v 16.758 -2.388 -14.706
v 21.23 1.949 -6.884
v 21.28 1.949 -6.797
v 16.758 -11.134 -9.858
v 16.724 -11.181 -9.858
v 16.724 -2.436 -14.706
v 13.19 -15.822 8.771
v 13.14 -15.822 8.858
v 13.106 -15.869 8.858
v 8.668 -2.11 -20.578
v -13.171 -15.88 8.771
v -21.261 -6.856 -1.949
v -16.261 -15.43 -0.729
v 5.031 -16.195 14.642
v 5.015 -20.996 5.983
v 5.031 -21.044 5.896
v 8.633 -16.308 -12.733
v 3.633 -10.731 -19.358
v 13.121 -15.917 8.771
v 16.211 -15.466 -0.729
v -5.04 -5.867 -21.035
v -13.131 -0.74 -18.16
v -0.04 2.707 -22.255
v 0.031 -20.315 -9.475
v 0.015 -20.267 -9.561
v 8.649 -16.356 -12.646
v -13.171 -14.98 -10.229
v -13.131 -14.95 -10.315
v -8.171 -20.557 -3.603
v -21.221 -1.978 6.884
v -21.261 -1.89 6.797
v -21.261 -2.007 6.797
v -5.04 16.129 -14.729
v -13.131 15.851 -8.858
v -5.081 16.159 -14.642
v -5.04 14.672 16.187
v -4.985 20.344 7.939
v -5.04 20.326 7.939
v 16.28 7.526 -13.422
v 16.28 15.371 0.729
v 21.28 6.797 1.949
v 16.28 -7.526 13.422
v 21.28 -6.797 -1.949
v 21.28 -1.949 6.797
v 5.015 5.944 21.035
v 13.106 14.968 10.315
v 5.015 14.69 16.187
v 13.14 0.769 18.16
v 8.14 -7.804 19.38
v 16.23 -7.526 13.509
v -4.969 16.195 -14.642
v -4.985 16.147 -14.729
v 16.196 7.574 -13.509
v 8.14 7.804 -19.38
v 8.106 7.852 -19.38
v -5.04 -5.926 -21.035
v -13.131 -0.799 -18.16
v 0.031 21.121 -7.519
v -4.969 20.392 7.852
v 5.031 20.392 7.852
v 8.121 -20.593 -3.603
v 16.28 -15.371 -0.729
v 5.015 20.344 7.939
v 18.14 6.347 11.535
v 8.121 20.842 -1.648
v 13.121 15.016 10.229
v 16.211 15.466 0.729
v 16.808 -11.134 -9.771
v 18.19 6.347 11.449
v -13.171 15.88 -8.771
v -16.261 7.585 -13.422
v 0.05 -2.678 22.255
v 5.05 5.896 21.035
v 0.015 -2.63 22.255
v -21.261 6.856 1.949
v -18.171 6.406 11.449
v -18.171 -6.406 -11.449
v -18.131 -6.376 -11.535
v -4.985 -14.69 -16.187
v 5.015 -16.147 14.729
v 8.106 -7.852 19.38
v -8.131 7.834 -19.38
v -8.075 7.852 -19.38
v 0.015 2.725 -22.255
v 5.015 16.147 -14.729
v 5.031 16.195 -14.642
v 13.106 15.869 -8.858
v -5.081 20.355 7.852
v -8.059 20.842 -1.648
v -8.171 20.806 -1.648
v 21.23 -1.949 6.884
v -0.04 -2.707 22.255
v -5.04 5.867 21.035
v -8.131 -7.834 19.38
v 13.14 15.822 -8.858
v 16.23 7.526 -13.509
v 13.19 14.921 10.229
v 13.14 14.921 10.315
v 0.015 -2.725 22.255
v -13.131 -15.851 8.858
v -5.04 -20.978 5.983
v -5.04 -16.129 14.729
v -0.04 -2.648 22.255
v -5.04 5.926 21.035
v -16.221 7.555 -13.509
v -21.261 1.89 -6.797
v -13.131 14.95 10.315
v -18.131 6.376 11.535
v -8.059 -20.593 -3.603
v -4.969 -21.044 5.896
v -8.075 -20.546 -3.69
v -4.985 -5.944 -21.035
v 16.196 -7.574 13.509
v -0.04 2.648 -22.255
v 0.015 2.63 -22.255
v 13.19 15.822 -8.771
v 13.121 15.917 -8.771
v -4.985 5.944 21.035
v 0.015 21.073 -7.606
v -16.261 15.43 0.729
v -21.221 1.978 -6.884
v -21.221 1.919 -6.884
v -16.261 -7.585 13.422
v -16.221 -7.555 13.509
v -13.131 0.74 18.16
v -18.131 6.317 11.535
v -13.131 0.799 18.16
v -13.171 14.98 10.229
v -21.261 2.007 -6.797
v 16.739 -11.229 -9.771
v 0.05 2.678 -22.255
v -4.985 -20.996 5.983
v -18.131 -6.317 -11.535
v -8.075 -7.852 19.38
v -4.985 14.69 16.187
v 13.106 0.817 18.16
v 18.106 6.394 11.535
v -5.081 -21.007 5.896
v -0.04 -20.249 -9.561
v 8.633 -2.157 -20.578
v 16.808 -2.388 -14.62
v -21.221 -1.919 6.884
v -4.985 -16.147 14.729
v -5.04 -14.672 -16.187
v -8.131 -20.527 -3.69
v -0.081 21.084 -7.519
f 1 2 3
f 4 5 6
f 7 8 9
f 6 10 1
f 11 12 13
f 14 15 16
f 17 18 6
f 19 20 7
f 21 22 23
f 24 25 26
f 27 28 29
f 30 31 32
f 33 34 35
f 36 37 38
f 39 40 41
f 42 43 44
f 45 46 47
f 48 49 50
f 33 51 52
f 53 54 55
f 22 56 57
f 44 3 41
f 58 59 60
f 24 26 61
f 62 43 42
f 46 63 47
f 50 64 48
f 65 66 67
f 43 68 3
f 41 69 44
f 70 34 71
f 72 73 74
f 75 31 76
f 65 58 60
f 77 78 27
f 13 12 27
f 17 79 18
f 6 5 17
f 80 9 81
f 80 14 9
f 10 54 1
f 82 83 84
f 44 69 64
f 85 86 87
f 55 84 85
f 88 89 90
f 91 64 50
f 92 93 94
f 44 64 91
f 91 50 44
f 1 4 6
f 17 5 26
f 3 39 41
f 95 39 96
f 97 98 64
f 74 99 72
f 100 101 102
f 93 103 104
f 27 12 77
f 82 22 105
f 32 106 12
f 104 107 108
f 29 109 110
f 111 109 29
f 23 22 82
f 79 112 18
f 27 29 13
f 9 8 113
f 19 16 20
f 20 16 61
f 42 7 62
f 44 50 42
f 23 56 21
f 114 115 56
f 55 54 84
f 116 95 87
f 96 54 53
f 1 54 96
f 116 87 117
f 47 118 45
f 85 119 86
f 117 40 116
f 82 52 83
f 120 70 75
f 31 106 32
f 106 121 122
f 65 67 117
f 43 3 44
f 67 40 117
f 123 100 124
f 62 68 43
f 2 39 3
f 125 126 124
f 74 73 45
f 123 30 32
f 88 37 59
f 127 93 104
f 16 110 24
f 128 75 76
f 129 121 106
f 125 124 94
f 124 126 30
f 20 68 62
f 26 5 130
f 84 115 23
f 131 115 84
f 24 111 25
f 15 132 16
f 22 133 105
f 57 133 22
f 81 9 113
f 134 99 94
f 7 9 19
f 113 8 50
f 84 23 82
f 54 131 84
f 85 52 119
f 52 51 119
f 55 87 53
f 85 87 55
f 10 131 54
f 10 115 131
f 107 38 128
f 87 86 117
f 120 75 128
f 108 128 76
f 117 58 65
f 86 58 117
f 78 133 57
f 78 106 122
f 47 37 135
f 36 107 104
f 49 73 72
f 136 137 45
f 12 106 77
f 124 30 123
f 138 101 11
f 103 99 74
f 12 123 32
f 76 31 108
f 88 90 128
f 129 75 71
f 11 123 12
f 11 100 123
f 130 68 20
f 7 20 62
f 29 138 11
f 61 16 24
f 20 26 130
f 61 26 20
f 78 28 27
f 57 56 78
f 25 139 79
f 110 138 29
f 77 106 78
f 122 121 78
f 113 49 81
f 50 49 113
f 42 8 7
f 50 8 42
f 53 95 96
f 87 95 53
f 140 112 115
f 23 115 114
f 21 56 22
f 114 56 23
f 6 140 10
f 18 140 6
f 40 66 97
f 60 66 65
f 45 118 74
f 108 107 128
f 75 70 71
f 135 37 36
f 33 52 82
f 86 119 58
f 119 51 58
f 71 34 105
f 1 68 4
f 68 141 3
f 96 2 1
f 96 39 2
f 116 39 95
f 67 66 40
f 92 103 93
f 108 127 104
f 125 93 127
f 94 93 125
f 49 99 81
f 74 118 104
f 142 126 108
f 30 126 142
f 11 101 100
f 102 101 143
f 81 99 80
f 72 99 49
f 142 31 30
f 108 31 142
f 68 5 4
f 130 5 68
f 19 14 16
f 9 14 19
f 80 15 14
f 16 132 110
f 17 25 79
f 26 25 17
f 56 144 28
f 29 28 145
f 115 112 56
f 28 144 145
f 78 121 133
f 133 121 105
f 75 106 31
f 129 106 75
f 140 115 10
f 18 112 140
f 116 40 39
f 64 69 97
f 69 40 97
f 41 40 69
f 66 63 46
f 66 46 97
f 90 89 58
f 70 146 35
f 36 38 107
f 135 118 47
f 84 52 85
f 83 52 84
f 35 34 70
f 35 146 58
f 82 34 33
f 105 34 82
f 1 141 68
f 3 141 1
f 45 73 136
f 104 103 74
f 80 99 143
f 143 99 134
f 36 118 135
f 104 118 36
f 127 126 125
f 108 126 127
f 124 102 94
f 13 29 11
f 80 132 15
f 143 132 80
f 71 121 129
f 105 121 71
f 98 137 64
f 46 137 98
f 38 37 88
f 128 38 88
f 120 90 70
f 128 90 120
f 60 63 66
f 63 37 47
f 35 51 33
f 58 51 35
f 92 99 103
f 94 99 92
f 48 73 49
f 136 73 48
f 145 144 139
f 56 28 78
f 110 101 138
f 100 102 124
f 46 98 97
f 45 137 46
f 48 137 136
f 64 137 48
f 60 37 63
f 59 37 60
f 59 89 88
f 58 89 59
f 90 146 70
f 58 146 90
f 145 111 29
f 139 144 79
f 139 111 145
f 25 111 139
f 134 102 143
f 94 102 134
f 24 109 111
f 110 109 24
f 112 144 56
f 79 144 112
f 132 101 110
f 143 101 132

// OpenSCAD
// Auto-generated OpenSCAD file

    inner_points = 10*[[0.5000000000001233, 1.6099947582269307, -1.4642352461204697], [-1.6180339887500594, -0.7526043623065494, 1.3422446358941107], [0.8090169943752056, 0.7804419520270026, -1.929370322107236], [-1.3090169943749772, -1.5821571685064775, 0.8771095599073444], [1.3090169943749772, 1.5821571685064775, -0.8771095599073444], [-0.8090169943752056, -0.7804419520270026, 1.929370322107236], [1.6180339887500594, 0.7526043623065494, -1.3422446358941107], [-0.5000000000001233, -1.6099947582269307, 1.4642352461204697], [-1.6180339887497301, 0.752604362306319, -1.342244635894637], [-2.118033988749798, 0.1948703662791984, -0.6797246062536065], [-1.309016994374648, -0.07694844389360919, -1.8073797118814032], [-1.8090169943747159, -0.6346824399207297, -1.144859682240373], [1.8090169943747159, 0.6346824399207297, 1.144859682240373], [1.309016994374648, 0.07694844389360919, 1.8073797118814032], [2.118033988749798, -0.1948703662791984, 0.6797246062536065], [1.6180339887497301, -0.752604362306319, 1.342244635894637], [-2.7630675525358583e-14, 2.1025431187665826, -0.7519178221235898], [-1.30901699437522, 1.4920728358409685, 1.0228690720136886], [0.8618033988753376, -0.21095885990434457, -2.0491118170111076], [2.9809488211185453e-13, -2.021969242147636, -0.9474747285857835], [0.8090169943748263, 2.0747055290461294, -0.1647921359104645], [-0.500000000000366, 1.4642352461205153, 1.609994758226814], [1.6708203932501915, -0.2387964496247978, -1.4619861307979825], [0.8090169943751521, -2.0498068318680893, -0.3603490423726582], [-0.5000000000002721, 2.0296633627133747, 0.7851971800500518], [-1.309016994375247, 0.07694844389342262, 1.8073797118809776], [0.8618033988753109, -1.6260832518518904, -1.264601177143819], [-0.49999999999994665, -2.094848998200844, 0.5896402735878584], [-0.8090169943746892, 0.7804419520268874, -1.9293703221074994], [-2.118033988749815, -0.6797246062534129, -0.19487036627969367], [2.118033988749815, 0.6797246062534129, 0.19487036627969367], [0.8090169943746892, -0.7804419520268874, 1.9293703221074994], [-1.6180339887500161, 1.5371150021736077, 0.07287975605290908], [-0.49999999999963374, -1.4642352461205865, -1.6099947582269767], [0.49999999999963374, 1.4642352461205865, 1.6099947582269767], [1.6180339887500161, -1.5371150021736077, -0.07287975605290908], [-0.49999999999987643, 1.6099947582268597, -1.4642352461206323], [-2.1180339887499917, -0.19487036627950022, 0.6797246062529179], [3.4166940110491595e-13, 0.26775012233252143, -2.2168396084269855], [-1.6180339887497732, -1.5371150021738385, -0.07287975605343533], [1.6180339887497732, 1.5371150021738385, 0.07287975605343533], [-3.4166940110491595e-13, -0.26775012233252143, 2.2168396084269855], [2.1180339887499917, 0.19487036627950022, -0.6797246062529179], [0.49999999999987643, -1.6099947582268597, 1.4642352461206323], [-1.3090169943749175, 1.5821571685062912, -0.8771095599077703], [-2.118033988749975, 0.6797246062531112, 0.1948703662790049], [-0.4999999999996173, -0.5896402735879751, -2.0948489982008898], [-1.3090169943746748, -1.4920728358411552, -1.0228690720141145], [1.3090169943746748, 1.4920728358411552, 1.0228690720141145], [0.4999999999996173, 0.5896402735879751, 2.0948489982008898], [2.118033988749975, -0.6797246062531112, -0.1948703662790049], [1.3090169943749175, -1.5821571685062912, 0.8771095599077703], [-0.8090169943750684, 2.074705529046014, -0.1647921359107279], [-1.8090169943751788, 0.634682439920472, 1.1448596822397847], [0.36180339887537877, -1.068349255824841, -1.9271212067850119], [-0.8090169943747427, -2.0498068318682043, -0.3603490423729214], [0.4999999999997277, 2.029663362713446, 0.7851971800502144], [-0.5000000000003827, 0.5896402735879039, 2.0948489982007272], [1.6708203932501748, -1.1133914221574093, -0.9771318908240696], [0.5000000000000535, -2.0948489982007725, 0.589640273588021]];

    outer_points = 10*[[-0.5000000000005009, -0.7851971800501374, -2.0296633627132854], [-0.4999999999996386, 1.6099947582268983, 1.4642352461206711], [-0.5000000000003614, -1.6099947582268983, -1.4642352461204242], [-0.4999999999994991, 0.7851971800501374, 2.0296633627135323], [0.4999999999994991, -0.7851971800501374, -2.0296633627135323], [0.5000000000003614, 1.6099947582268983, 1.4642352461204242], [0.4999999999996386, -1.6099947582268983, -1.4642352461206711], [0.5000000000005009, 0.7851971800501374, 2.0296633627132854], [-2.1180339887500663, 0.12968473079194998, -0.6951128473842882], [-2.118033988749863, 0.6951128473848109, 0.1296847307924727], [-2.118033988749927, -0.6951128473848109, -0.12968473079142726], [-2.1180339887497235, -0.12968473079194998, 0.6951128473853336], [2.1180339887497235, 0.12968473079194998, -0.6951128473853336], [2.118033988749927, 0.6951128473848109, 0.12968473079142726], [2.118033988749863, -0.6951128473848109, -0.1296847307924727], [2.1180339887500663, -0.12968473079194998, 0.6951128473842882], [-0.5000000000005347, 0.2053913419602993, -2.166536954253724], [-0.5000000000001937, 2.029663362713409, -0.785197180050014], [-0.5000000000001456, -2.0948489982008094, -0.5896402735878118], [-0.49999999999960265, -1.4642352461205477, 1.6099947582270218], [0.4999999999994653, 0.2053913419602993, -2.1665369542539707], [0.4999999999998062, 2.029663362713409, -0.7851971800502607], [0.4999999999998545, -2.0948489982008094, -0.5896402735880585], [0.5000000000003973, -1.4642352461205477, 1.6099947582267748], [-3.811205046546957e-13, 1.612821613342072, -1.5443038629222117], [1.8556665349805936e-13, 2.102543118766584, 0.7519178221235856], [2.338283645958706e-13, -2.021969242147634, 0.9474747285857879], [5.50894046796066e-13, -0.05680497473877466, 2.2322278495585337], [-1.809016994375214, -0.7401550137174742, -1.0796740467522328], [-1.809016994374681, 0.7401550137174742, 1.0796740467531258], [1.809016994374681, -0.7401550137174742, -1.0796740467531258], [1.809016994375214, 0.7401550137174742, 1.0796740467522328], [-1.3090169943752, 1.4920728358410598, -1.0228690720135816], [-1.309016994374695, -1.4920728358410598, 1.0228690720142277], [1.309016994374695, 1.4920728358410598, -1.0228690720142277], [1.3090169943752, -1.4920728358410598, 1.0228690720135816], [-1.3090169943753898, -0.24760665317778863, -1.7919914707493183], [-1.309016994374731, 1.5821571685063862, 0.8771095599078771], [-1.309016994375164, -1.5821571685063862, -0.8771095599072309], [-1.3090169943745051, 0.24760665317778863, 1.7919914707499645], [1.3090169943745051, -0.24760665317778863, -1.7919914707499645], [1.309016994375164, 1.5821571685063862, 0.8771095599072309], [1.309016994374731, -1.5821571685063862, -0.8771095599078771], [1.3090169943753898, 0.24760665317778863, 1.7919914707493183], [-1.6180339887502422, 0.6222330913316356, -1.4074302713813738], [-1.6180339887499129, 1.537115002173723, -0.072879756052776], [-1.618033988749877, -1.537115002173723, 0.07287975605357463], [-1.6180339887495476, -0.6222330913316356, 1.4074302713821722], [1.6180339887495476, 0.6222330913316356, -1.4074302713821722], [1.618033988749877, 1.537115002173723, -0.07287975605357463], [1.6180339887499129, -1.537115002173723, 0.072879756052776], [1.6180339887502422, -0.6222330913316356, 1.4074302713813738], [-0.8090169943753872, 1.0752310864697234, -1.7819757548857793], [-0.8090169943749068, 2.0747055290460716, 0.16479213591079148], [-0.8090169943748585, -2.049806831868146, 0.36034904237299387], [-0.8090169943744552, -0.5943955016111235, 1.9945559575949663], [0.8090169943745077, 1.0752310864697234, -1.7819757548861785], [0.8090169943749881, 2.0747055290460716, 0.16479213591039218], [0.8090169943750364, -2.049806831868146, 0.3603490423725945], [0.8090169943754397, -0.5943955016111235, 1.994555957594567]];

    // Convex hull for inner set (I)
    module inner_hull() {
        hull() {
            for (p = inner_points) {
                translate(p) sphere(r=0.1);
            }
        }
    }

    // Convex hull for outer set (O) minus inner hull (O \ I)
    module outer_minus_inner() {
        difference() {
            hull() {
                for (p = outer_points) {
                    translate(p) sphere(r=0.1);
                }
            }
            inner_hull(); // Subtract inner hull
        }
    }

    // Convex hull for outer set (O) minus all translated inner hulls
    module outer_minus_AllTranslationInner() {
        difference() {
            hull() {
                for (p = outer_points) {
                    translate(p) sphere(r=0.1);
                }
            }
            hull() {
                translate([0,0,50]) inner_hull();
                translate([0,0,-50]) inner_hull();
            }; // Subtract translated inner hulls
        }
    }

    // Difference between outer_minus_inner and outer_minus_AllTranslationInner
    module outer_minus_inner_diff() {
        difference() {
            // Outer minus inner
            difference() {
                hull() {
                    for (p = outer_points) {
                        translate(p) sphere(r=0.1);
                    }
                }
                inner_hull();
            }

            // Subtract Outer minus AllTranslationInner
            difference() {
                hull() {
                    for (p = outer_points) {
                        translate(p) sphere(r=0.1);
                    }
                }
                hull() {
                    translate([0,0,50]) inner_hull();
                    translate([0,0,-50]) inner_hull();
                };
            }
        }
    }

    // Rendering all with colors applied
    color([1, 0, 0, 0.5]) inner_hull(); // Transparent red
    
